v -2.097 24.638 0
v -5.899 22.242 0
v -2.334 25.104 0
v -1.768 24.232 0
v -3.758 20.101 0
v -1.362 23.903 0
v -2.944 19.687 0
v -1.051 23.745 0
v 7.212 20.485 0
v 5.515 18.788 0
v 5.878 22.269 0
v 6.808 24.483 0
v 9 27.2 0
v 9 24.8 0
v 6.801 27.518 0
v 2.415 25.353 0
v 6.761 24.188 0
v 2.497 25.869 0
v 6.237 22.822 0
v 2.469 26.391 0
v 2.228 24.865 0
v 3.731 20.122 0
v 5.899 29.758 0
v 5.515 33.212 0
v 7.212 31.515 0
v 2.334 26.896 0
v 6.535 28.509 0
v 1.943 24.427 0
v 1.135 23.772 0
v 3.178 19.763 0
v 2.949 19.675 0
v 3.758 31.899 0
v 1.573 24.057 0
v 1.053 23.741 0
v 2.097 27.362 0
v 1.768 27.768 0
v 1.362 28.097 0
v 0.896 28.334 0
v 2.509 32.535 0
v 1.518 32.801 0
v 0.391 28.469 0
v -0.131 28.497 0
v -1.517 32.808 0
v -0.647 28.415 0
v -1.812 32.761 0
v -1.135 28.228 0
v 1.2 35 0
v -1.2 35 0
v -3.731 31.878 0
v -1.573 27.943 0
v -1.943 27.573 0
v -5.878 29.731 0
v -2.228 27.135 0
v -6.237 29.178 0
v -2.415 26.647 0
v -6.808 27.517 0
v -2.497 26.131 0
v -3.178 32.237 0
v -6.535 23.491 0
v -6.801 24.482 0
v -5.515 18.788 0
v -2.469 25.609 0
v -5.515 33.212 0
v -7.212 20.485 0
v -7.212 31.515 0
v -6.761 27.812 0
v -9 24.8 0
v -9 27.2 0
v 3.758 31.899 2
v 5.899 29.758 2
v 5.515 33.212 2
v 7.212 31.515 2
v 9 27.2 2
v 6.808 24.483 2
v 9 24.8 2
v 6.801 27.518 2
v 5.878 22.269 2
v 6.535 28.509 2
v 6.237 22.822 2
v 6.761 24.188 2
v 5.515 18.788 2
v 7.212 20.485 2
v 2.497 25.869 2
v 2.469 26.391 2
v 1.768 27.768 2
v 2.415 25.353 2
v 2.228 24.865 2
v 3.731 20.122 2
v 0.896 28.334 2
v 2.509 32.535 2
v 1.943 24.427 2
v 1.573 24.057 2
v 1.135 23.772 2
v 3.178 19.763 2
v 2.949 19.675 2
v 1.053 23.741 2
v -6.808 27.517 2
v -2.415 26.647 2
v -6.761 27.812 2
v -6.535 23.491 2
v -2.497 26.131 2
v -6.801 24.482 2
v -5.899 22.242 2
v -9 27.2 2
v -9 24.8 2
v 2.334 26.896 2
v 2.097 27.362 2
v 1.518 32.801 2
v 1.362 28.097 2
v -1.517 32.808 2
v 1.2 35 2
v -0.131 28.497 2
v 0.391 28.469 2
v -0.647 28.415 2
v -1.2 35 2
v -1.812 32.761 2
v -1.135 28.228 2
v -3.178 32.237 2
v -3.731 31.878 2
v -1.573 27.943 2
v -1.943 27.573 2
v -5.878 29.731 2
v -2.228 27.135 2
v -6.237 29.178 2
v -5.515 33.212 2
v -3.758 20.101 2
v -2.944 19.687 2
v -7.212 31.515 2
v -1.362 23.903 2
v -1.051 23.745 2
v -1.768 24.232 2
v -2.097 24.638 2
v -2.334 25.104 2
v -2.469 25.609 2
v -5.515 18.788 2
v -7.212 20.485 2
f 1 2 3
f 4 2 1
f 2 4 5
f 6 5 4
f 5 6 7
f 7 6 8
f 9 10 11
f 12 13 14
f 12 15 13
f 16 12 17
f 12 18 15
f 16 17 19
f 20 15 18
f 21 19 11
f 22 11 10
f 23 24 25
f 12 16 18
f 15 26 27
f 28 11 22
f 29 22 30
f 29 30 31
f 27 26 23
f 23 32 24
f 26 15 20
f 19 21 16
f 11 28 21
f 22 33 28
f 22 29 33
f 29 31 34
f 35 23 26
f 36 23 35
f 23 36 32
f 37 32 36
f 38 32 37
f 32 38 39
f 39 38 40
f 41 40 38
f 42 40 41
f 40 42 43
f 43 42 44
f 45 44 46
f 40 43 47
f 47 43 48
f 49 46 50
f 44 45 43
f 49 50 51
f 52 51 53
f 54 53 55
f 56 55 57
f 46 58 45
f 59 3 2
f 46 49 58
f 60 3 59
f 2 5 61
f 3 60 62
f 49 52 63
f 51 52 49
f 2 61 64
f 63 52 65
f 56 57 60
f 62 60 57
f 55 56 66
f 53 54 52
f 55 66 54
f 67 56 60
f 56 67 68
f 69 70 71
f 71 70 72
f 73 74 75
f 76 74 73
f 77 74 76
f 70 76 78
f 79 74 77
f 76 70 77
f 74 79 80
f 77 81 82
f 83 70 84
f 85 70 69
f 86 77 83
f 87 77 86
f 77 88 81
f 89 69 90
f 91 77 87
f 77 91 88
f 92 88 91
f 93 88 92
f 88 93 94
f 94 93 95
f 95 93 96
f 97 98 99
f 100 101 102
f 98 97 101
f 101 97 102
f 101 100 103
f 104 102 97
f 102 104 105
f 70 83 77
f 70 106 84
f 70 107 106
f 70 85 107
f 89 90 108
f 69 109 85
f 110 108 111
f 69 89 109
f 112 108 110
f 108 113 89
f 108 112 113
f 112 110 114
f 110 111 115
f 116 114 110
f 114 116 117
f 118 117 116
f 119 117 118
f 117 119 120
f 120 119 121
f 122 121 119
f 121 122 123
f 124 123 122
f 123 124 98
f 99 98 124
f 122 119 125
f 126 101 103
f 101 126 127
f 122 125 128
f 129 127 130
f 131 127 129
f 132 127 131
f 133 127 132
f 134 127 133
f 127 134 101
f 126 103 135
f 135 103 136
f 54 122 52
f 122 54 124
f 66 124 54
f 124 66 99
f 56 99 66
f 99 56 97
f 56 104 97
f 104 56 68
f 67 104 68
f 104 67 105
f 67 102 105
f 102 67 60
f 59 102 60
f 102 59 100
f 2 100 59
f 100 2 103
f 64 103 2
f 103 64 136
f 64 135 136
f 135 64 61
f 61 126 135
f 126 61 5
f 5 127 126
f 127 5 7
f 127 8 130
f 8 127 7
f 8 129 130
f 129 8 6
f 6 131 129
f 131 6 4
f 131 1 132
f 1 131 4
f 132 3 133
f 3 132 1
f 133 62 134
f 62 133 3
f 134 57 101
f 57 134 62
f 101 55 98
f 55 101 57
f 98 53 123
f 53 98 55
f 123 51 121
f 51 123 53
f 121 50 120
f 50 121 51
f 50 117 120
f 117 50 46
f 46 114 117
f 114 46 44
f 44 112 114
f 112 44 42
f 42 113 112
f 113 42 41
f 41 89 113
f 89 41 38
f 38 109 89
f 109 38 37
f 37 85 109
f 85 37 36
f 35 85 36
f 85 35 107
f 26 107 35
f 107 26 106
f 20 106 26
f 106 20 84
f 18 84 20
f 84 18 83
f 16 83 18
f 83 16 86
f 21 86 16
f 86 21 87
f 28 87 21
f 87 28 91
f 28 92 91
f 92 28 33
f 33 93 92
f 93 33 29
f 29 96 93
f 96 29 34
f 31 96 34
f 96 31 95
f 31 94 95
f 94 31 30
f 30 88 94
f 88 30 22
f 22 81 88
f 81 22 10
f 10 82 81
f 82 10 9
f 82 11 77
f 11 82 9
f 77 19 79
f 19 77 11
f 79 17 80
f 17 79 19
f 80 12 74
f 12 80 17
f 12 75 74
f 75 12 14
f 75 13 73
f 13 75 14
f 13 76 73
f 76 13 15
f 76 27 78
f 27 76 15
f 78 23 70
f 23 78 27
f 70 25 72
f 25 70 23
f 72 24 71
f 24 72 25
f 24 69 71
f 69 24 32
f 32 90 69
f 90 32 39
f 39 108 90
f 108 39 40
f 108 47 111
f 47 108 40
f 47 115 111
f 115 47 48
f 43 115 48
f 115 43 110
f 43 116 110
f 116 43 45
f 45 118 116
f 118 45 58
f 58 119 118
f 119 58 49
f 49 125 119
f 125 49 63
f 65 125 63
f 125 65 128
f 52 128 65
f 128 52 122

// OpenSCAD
// file: OpenHardwareLogo.scad
// OSHW Logo Generator
use_files=false;
// use_files=true;
// render_part=1; // gear_tooth_2d()
// render_part=2; // oshw_logo_2d()
 render_part=3; // 4mm shelled oshw_logo_2d()
// render_part=4; // 1 inch OSHW Coin

module gear_tooth_2d(scale=1.0) {
  scale([scale,scale]) polygon(
    points=[ [0,25.0], [90.0,12.0], [90.0,-12.0], [0,-25.0] ]
    , paths=[ [0,1,2,3] ]
    );
}

if(render_part==1) {
  echo("Rendering gear_tooth_2d()...");
  gear_tooth_2d();
}

module oshw_logo_2d(scale=1.0) {
  scale([scale,scale]) rotate(-45-90) {
    difference() {
      union() {
	  circle(r=70.0);
	  for(i=[1:7]) assign(rotAngle=360*i/8+45) rotate(rotAngle) {
	    gear_tooth_2d();
	  }
	}
	circle(r=25.0);
	intersection() {
	  rotate(-20) square(size=[100,100]);
	  rotate(20)  square(size=[100,100]);
	}
    }
  }
}

if(render_part==2) {
  echo("Rendering gear_tooth_2d()...");
  oshw_logo_2d();
}

module shell_2d(width=2.0,steps=8,scale_x=1.0,scale_y=1.0) {
  union() {
    for(i=[0:steps-1]) assign(rotAngle=360*i/steps) difference() {
      child(0);
      translate([scale_x*width*cos(rotAngle),scale_y*width*sin(rotAngle)]) 
	  child(0);
    }
  }
}

if(render_part==3) {
  // Note: Don't perform shell operation on oshw_logo_2d() directly. It's rather inefficient.
  echo("Rendering 4mm shelled gear_tooth_2d()...");
  if(!use_files) shell_2d(width=4.0,steps=16,scale_x=1.0,scale_y=1.0)
    render() oshw_logo_2d(scale=1.0);
  if(use_files) shell_2d(width=4.0,steps=16,scale_x=1.0,scale_y=1.0)
    import_dxf(file="static_files/oshw_logo_2d.dxf");
}

module oshw_coin(scale=0.1, coin_h=10.0, coin_wall_th=4.0, extension=0.1) {
  scale([scale/200,scale/200,scale/200]) union() {
    difference() {
	cylinder(r=100.0,h=coin_h,center=false);
	translate([0,0,coin_wall_th])
	  cylinder(r=100.0-coin_wall_th,h=coin_h-coin_wall_th+extension,center=false);
	translate([0,0,-extension])  linear_extrude(height=coin_wall_th/2+extension,center=false) 
	  scale([(100.0-coin_wall_th)/100.0,(100.0-coin_wall_th)/100.0]) {
	    if(use_files) shell_2d(width=coin_wall_th,steps=32) import_dxf(file="static_files/oshw_logo_2d.dxf");
	    if(!use_files) shell_2d(width=coin_wall_th,steps=32) render() oshw_logo_2d(scale=1.0);
	  }
    }
    translate([0,0,coin_wall_th]) color([0,0,1.0]) linear_extrude(height=(coin_h-coin_wall_th)/2,center=false)
	  scale([(100.0-coin_wall_th)/100.0,(100.0-coin_wall_th)/100.0]) {
	    if(use_files) import_dxf(file="static_files/oshw_logo_2d.dxf");
	    if(!use_files) render() oshw_logo_2d(scale=1.0);
	  }
    translate([0,0,coin_wall_th-extension]) color([0,0,0])
	linear_extrude(height=coin_h-coin_wall_th+extension,center=false) scale([(100.0-coin_wall_th)/100.0,(100.0-coin_wall_th)/100.0]) {
	    if(use_files) shell_2d(width=coin_wall_th,steps=32) import_dxf(file="static_files/oshw_logo_2d.dxf");
	    if(!use_files) shell_2d(width=coin_wall_th,steps=32) render() oshw_logo_2d(scale=1.0);
	}
  }
}

if(render_part==4) {
  echo("Rendering OSHW Coin scaled to 25.4mm, aka 1 inch...");
  echo("  Note: Colours aren't preserved in the final STL output.");
  oshw_coin(scale=25.4,coin_h=20.0,coin_wall_th=8.0);
}
// main file
// ClothBot Badge
// ...because I need one.
// ...and it should be printed on cloth
// ...just because.


use <OpenHardwareLogo.scad>

difference() {
  union() {
    linear_extrude(height=2.0) scale(3.0) translate([-4,-4]) render() import($fs=0.1,file="LCBlock_2x2_CLOTHBOT.dxf",scale=1.0);
    linear_extrude(height=3.0) scale(4.0) translate([-4,-4]) render() import($fs=0.1,file="CLOTHBOT_Letters.dxf",scale=1.0);
    translate([0,26,0]) linear_extrude(height=2.0) scale(0.1) render() oshw_logo_2d(scale=1.0);
    translate([0,26,1.0]) linear_extrude(height=2.0) render() import($fs=0.1,file="OpenHardwareLogo_Shell.dxf",scale=0.1);
  }
  translate([0,0,-0.1])
    linear_extrude(height=1.0+0.1) scale(4.0) translate([-4,-4]) render() import($fs=0.1,file="CLOTHBOT_Letters.dxf",scale=1.0);

}
